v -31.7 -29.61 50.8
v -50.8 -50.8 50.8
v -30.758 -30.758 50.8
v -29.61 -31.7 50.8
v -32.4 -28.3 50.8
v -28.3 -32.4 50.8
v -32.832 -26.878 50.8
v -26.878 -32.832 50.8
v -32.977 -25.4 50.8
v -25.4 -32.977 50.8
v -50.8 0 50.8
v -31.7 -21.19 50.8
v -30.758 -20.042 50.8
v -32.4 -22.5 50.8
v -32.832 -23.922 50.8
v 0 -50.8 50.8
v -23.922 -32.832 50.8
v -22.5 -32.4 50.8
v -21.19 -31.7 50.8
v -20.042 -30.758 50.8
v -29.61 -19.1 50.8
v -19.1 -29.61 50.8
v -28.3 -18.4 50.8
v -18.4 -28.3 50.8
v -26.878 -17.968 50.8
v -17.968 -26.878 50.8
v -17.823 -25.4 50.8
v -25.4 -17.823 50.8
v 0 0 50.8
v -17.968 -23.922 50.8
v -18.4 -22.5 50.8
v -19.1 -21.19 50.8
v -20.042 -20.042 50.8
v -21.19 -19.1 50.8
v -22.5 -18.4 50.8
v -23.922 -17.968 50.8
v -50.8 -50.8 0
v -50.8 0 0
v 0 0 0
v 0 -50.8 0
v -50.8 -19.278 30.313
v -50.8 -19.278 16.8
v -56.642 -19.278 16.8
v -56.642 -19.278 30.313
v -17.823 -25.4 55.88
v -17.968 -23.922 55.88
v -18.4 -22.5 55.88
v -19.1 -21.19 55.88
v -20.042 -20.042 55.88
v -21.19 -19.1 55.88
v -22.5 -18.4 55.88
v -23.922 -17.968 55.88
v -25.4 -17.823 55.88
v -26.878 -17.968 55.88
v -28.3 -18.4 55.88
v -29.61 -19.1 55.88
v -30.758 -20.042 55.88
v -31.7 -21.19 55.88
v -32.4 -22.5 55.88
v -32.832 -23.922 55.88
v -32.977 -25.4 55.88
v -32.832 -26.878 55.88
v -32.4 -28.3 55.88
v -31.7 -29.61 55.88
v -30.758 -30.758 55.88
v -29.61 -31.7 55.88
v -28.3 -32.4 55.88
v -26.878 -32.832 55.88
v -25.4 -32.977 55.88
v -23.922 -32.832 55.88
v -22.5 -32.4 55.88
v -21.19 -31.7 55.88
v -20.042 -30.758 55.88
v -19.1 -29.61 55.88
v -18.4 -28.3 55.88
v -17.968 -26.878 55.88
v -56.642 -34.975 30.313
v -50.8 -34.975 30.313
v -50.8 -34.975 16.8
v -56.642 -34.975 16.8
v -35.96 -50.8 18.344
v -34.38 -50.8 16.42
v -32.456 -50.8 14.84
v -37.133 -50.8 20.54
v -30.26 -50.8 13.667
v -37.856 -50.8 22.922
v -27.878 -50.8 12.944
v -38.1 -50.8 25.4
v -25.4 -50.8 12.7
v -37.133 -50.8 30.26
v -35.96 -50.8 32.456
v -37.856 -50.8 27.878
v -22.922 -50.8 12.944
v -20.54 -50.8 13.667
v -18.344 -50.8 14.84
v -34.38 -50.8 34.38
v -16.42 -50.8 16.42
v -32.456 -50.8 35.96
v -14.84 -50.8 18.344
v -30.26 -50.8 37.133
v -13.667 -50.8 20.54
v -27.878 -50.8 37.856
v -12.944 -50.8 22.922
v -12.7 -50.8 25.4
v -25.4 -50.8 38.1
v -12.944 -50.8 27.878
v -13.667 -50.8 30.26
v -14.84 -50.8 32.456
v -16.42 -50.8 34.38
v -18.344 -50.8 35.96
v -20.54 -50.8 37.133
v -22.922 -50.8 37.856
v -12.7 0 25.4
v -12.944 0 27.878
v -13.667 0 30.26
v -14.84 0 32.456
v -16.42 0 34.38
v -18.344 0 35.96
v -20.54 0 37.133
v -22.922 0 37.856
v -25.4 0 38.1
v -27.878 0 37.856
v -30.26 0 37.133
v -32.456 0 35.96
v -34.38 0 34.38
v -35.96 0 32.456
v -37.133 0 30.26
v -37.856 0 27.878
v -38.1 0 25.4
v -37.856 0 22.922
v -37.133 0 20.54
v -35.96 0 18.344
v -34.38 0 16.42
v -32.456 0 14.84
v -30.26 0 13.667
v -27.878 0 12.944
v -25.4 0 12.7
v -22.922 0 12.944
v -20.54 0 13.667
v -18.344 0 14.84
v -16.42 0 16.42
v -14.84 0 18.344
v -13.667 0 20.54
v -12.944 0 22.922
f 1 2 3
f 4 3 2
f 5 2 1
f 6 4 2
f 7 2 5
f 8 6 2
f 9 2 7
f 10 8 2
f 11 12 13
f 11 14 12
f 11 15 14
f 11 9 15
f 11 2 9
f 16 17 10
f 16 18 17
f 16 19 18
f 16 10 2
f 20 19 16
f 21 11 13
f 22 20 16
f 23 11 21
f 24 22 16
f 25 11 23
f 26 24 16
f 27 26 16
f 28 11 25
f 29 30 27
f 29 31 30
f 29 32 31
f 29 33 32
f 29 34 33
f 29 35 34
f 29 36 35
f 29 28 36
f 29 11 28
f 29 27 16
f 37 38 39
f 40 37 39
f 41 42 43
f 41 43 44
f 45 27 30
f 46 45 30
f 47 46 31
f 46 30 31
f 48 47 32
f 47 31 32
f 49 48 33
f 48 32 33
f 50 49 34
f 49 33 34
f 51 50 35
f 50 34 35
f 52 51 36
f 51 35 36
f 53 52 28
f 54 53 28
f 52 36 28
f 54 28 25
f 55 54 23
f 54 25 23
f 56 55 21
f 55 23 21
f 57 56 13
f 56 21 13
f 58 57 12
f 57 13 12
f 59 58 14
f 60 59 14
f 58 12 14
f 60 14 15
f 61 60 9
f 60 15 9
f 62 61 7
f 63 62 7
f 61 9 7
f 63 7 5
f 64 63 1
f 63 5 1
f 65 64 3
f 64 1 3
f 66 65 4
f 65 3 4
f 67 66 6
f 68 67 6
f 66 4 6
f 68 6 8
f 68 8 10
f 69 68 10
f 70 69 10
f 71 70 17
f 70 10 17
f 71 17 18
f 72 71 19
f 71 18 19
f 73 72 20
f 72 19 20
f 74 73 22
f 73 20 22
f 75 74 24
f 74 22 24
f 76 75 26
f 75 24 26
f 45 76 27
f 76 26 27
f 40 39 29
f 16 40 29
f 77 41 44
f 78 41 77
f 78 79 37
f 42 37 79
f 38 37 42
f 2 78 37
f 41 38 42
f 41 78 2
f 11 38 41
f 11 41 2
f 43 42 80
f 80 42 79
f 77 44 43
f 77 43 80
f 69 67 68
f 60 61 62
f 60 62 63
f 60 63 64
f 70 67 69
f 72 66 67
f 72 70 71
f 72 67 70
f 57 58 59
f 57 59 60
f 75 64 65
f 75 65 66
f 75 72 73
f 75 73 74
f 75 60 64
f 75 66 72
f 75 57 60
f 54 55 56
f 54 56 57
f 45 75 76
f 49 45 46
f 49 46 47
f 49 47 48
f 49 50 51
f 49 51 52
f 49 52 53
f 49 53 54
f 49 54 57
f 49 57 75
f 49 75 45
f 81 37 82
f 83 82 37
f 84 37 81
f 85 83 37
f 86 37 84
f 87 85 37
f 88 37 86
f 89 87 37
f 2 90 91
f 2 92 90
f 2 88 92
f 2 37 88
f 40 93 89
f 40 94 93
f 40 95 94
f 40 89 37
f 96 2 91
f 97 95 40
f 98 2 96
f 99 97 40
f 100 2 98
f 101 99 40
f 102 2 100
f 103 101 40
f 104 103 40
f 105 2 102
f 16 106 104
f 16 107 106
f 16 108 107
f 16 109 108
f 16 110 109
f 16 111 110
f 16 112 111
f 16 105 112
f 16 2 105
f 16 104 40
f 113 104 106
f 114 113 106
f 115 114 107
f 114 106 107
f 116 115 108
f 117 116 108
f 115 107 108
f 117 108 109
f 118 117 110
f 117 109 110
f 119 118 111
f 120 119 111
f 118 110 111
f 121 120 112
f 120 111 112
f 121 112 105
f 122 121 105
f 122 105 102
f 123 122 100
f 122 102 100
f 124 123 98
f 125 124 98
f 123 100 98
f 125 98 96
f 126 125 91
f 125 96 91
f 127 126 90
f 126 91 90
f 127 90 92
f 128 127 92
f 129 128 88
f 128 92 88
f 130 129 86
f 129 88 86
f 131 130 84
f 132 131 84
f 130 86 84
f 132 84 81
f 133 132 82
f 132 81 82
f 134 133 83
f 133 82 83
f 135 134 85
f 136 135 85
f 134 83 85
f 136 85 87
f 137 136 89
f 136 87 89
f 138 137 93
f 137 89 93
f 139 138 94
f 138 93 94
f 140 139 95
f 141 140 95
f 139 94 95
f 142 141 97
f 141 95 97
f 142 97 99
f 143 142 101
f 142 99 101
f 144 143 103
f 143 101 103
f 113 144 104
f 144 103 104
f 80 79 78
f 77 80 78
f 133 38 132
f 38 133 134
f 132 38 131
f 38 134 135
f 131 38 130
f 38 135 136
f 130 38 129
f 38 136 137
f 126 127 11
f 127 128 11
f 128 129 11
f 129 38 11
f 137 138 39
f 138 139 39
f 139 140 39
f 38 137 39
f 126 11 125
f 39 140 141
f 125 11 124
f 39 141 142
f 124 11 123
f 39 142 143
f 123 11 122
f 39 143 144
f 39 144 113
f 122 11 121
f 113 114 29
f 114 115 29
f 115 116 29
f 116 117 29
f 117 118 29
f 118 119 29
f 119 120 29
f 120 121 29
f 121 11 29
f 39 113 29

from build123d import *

# Parameters (mm, degrees)
F0_W     = 50.8
F0_H     = 50.8
F1_DEPTH = 50.8
F2_R     = 12.7
F3_DEPTH = 50.8
F4_W     = 15.6972
F4_H     = 13.5128
F5_DEPTH = 5.842
F6_R     = 7.577209
F7_DEPTH = 5.08


with BuildPart() as f1:
    # F0 (on Front) → F1 (new body)
    with BuildSketch(Plane.XZ):
        with Locations((-25.4, 25.4)):
            Rectangle(F0_W, F0_H)
    extrude(amount=F1_DEPTH)

    # F2 (on face) → F3 (cut)
    with BuildSketch(Plane.XZ.offset(50.8)):
        with Locations((-25.4, 25.4)):
            Circle(F2_R)
    extrude(amount=-F3_DEPTH, mode=Mode.SUBTRACT)

    # F4 (on face) → F5 (join)
    with BuildSketch(Plane(origin=(-50.8, 0, 0), x_dir=(0, -1, 0), z_dir=(-1, 0, 0))):
        with Locations((27.126858, 23.556107)):
            Rectangle(F4_W, F4_H)
    extrude(amount=F5_DEPTH)

    # F6 (on face) → F7 (join)
    with BuildSketch(Plane.XY.offset(50.8)):
        with Locations((-25.4, -25.4)):
            Circle(F6_R)
    extrude(amount=F7_DEPTH)


solid = f1.part
